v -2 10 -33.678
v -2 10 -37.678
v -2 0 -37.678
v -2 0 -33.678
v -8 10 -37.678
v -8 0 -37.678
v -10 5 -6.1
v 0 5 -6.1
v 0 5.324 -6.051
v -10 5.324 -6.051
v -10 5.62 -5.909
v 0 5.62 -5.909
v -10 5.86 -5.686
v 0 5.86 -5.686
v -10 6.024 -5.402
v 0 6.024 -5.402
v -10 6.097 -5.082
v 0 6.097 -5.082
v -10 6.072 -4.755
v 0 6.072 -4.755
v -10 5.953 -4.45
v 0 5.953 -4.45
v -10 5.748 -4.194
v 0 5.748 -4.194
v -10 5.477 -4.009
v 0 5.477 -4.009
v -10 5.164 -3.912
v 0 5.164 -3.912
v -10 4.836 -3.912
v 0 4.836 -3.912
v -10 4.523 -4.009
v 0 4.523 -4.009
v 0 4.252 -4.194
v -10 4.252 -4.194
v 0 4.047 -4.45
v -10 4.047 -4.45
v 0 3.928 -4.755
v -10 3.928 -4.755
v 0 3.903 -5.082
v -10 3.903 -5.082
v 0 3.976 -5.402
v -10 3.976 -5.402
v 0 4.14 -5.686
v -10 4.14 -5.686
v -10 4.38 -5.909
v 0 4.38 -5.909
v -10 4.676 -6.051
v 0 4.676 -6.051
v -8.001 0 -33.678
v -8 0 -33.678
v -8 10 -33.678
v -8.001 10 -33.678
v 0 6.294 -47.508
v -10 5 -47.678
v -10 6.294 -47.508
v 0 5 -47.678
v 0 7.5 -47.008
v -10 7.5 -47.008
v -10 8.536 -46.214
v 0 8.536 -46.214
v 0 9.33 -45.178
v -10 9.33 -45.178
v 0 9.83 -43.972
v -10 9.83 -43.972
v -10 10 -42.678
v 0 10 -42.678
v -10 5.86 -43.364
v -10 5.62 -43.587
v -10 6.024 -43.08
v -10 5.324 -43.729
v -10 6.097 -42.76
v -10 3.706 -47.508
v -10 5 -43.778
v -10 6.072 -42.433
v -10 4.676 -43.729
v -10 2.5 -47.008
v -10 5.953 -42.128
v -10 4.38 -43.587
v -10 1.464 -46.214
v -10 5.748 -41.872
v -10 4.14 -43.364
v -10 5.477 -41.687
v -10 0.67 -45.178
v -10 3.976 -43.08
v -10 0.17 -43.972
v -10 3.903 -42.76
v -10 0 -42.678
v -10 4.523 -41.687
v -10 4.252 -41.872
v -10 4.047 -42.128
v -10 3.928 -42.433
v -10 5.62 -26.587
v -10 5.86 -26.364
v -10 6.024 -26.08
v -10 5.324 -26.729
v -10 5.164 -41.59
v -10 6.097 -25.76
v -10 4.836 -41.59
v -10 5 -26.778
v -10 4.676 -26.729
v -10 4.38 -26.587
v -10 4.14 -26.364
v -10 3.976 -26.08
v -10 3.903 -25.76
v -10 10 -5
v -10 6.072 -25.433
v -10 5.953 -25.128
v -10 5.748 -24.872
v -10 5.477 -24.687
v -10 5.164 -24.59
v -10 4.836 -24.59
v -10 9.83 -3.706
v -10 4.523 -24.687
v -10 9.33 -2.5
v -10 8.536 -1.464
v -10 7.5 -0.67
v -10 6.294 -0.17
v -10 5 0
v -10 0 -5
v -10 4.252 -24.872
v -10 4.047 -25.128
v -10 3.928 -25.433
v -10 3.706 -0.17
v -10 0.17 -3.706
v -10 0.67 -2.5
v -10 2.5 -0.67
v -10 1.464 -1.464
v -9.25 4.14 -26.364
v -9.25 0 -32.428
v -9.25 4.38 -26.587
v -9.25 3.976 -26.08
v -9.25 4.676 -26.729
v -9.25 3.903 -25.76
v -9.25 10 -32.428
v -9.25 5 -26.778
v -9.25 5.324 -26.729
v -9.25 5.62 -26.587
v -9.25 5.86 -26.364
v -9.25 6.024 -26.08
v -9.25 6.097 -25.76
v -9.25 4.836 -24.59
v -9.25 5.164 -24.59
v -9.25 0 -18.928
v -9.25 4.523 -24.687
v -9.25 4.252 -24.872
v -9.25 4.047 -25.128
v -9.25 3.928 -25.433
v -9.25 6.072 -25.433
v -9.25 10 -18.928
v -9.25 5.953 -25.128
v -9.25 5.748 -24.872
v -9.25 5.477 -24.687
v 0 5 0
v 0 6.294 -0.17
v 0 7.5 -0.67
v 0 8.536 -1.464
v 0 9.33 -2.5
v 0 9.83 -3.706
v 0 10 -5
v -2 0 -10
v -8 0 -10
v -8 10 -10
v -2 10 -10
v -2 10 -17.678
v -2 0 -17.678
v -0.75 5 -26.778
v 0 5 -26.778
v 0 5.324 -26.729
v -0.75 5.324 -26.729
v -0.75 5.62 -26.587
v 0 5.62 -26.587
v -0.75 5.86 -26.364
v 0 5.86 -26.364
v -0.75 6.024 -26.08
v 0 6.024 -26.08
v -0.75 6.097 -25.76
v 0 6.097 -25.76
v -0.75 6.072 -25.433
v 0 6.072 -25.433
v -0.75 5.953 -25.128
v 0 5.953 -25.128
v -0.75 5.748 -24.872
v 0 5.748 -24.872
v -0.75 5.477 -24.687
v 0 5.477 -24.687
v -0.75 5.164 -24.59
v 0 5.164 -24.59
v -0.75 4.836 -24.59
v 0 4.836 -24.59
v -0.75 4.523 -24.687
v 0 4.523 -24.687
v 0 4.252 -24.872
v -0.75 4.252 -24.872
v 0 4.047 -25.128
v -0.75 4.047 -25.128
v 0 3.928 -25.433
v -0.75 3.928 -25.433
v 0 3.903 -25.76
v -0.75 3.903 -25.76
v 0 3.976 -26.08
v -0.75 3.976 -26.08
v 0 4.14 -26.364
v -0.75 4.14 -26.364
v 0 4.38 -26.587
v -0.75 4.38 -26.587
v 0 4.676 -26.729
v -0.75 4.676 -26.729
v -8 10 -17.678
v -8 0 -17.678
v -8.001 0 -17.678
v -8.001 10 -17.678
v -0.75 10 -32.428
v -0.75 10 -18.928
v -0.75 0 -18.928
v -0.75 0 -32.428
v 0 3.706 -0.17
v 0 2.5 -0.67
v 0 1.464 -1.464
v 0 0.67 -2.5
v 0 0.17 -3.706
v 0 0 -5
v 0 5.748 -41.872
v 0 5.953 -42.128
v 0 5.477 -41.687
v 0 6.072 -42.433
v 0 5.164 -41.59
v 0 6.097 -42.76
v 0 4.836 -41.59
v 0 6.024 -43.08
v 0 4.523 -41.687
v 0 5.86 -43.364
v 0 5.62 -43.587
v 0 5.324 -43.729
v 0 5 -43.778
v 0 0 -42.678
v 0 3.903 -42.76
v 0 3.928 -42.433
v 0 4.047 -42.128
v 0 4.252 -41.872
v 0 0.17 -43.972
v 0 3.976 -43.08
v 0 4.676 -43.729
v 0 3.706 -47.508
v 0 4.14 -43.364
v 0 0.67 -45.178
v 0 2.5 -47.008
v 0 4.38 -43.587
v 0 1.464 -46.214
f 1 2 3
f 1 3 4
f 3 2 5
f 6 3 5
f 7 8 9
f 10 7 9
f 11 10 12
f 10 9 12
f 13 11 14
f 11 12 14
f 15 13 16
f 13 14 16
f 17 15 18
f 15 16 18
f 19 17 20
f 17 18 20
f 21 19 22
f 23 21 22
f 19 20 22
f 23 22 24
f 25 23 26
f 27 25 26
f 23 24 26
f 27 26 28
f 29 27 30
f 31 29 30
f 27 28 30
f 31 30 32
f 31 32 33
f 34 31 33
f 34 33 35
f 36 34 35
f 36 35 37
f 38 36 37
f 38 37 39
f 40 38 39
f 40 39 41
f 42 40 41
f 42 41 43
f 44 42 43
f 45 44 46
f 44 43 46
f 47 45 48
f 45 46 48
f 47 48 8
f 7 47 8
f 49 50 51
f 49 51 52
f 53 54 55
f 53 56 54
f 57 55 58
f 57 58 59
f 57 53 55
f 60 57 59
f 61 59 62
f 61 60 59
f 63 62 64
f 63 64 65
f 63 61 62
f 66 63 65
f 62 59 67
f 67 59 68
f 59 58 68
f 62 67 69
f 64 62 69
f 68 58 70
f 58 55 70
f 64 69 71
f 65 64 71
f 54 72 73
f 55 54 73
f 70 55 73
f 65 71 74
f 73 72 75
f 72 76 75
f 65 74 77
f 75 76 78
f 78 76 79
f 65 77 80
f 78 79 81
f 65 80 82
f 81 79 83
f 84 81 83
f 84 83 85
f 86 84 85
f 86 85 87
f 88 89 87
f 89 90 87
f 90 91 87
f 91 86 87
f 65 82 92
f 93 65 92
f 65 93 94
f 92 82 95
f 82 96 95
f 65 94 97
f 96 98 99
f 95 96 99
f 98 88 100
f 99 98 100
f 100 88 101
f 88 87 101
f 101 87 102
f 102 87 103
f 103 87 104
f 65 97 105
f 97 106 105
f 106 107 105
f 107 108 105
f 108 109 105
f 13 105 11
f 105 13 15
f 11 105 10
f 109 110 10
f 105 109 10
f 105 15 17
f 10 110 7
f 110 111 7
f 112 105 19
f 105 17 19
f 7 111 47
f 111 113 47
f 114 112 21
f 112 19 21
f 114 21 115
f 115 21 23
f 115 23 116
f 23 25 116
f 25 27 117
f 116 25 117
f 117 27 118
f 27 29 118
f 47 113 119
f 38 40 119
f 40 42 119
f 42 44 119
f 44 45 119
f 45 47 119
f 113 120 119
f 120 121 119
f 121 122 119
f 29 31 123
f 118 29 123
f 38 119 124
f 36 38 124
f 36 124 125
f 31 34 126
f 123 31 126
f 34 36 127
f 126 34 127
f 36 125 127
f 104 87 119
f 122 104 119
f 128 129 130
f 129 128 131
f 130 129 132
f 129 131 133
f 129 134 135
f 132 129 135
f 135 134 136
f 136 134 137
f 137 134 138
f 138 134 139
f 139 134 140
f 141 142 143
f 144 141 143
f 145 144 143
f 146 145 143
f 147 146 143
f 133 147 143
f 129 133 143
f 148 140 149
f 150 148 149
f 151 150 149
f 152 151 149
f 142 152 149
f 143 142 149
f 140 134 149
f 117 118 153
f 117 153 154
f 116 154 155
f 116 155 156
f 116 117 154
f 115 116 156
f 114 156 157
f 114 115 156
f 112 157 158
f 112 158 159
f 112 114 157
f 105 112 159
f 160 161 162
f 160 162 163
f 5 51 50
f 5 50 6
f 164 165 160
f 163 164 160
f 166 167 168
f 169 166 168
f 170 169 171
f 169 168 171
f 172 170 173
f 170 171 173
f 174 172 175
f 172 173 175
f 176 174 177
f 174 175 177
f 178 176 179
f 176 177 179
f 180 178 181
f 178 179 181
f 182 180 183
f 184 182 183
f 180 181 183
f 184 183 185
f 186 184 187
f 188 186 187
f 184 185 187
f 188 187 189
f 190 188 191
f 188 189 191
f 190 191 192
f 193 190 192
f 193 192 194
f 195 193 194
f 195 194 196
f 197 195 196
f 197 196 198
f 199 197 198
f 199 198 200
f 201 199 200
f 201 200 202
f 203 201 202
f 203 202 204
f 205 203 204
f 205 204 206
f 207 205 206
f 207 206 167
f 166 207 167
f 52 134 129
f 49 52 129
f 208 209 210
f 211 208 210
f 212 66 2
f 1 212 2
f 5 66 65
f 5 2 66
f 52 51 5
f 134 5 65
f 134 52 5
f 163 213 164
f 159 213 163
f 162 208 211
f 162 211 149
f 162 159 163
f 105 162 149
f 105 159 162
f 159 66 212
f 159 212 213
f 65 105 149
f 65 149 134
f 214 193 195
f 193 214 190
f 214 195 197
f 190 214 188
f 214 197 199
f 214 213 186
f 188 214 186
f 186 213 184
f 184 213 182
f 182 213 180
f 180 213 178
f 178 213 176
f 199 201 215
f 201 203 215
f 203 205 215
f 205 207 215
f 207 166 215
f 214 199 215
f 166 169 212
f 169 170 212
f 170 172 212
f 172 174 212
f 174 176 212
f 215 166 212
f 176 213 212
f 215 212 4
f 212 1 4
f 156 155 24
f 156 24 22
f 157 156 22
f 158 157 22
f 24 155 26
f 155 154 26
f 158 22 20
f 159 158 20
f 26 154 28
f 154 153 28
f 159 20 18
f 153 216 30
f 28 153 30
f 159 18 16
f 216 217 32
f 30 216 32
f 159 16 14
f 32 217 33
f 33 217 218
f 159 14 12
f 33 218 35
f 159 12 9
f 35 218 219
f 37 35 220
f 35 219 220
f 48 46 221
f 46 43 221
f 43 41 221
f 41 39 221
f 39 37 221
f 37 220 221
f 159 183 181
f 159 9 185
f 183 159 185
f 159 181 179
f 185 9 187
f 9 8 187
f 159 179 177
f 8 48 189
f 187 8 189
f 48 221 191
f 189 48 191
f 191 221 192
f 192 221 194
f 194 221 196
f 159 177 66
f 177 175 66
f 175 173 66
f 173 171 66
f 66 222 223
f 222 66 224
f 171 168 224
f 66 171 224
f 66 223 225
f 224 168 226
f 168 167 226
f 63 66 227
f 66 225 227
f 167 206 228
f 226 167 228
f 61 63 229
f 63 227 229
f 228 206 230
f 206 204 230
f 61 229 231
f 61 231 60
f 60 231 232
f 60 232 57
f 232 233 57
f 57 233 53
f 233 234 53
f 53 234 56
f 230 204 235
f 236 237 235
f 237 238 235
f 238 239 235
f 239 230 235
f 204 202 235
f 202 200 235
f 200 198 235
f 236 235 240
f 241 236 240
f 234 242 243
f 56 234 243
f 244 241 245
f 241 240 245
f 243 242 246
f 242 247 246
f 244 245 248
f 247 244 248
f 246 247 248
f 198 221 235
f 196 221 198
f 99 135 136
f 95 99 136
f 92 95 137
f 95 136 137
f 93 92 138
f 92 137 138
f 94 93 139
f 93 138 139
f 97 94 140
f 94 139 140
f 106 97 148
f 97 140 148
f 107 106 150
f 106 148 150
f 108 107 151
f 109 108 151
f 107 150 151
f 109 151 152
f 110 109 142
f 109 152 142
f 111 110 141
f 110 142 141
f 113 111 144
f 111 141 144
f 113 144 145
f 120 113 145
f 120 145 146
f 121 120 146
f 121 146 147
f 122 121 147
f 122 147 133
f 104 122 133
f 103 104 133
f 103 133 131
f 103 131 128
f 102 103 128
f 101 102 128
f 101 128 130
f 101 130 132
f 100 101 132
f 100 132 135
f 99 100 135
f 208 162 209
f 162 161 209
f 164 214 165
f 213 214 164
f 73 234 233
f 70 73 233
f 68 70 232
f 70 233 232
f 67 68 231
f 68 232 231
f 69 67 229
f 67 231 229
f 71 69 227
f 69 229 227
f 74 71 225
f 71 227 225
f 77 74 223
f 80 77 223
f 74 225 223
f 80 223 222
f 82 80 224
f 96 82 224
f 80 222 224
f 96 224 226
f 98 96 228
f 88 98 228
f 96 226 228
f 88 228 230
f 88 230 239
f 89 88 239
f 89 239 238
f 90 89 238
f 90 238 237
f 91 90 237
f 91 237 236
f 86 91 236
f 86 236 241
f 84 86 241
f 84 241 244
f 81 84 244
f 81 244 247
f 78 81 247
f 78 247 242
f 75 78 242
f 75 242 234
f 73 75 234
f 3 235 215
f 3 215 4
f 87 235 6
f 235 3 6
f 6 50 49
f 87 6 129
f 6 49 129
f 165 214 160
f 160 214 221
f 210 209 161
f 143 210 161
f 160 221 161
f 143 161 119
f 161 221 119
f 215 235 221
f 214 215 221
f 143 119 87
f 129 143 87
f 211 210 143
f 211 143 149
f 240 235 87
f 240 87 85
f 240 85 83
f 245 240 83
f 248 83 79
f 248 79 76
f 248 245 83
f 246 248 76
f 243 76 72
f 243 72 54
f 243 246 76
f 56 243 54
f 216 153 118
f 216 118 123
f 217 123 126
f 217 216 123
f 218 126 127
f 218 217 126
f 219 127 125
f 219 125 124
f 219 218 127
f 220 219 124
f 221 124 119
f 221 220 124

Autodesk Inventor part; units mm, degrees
ref_plane "YZ Plane" through (0, 0, 0) normal (1, 0, 0) x (0, 1, 0)
ref_plane "XZ Plane" through (0, 0, 0) normal (0, 1, 0) x (-1, 0, 0)
ref_plane "XY Plane" through (0, 0, 0) normal (0, 0, 1) x (1, 0, 0)
sketch "Sketch1" plane through (0, 0, 0) normal (0, 1, 0) x (-1, 0, 0)
  line L0 (0, 0) -> (0, -60)
  line L1 (0, -60) -> (10, -60)
  line L2 (10, -60) -> (10, 0)
  line L3 (10, 0) -> (0, 0)
  line L4 (10, -60) -> (10, -58)
  line L5 (10, -58) -> (0, -58)
  line L6 (10, -58) -> (8, -58)
  line L7 (0, 0) -> (2, 0)
  line L8 (2, 0) -> (2, -2)
  line L9 (2, -2) -> (0, -2)
  line L10 (0, -2) -> (0, 0)
  line L11 (2, -2) -> (8, -2)
  line L12 (8, -2) -> (8, -58)
  line L13 (8, -58) -> (2, -58)
  line L14 (2, -58) -> (2, -2)
  line L15 (10, 0) -> (10, -10)
  line L16 (10, -10) -> (0, -10)
  line L17 (8, -10) -> (8, -18)
  line L18 (8, -18) -> (2, -18)
  line L19 (2, -18) -> (1, -18)
  point P0 (2, -10)
  dimension "d0" = 60
  dimension "d1" = 10
  dimension "d2" = 2
  dimension "d3" = 2
  dimension "d4" = 2
  dimension "d5" = 2
  dimension "d8" = 10
  dimension "d29" = 8
extrude "Extrusion1" add sketch "Sketch1" along normal blind 10 contours L3 L8 L9 L0 | L9 L14 L16 L0 | L3 L2 L16 L12 L11 L8 | L16 L14 L5 L0 | L11 L12 L16 L14 | L5 L2 L1 L0 | L2 L5 L12 L16
fillet "Fillet1" radius 5 2 edges at (-5, 10, 0) (-5, 0, 0)
sketch "Sketch2" plane through (0, 0, -60) normal (1, 0, 0) x (0, 0, -1)
  arc A0 (-55, 10) -> (-55, 0) centre (-55, 5) ccw projected
  line L0 (-55, 10) -> (-55, 0)
  circle A1 centre (-55, 5) radius 1.1
  point P0 (-60, 0)
  dimension "d10" = 2.2
extrude "Extrusion2" cut sketch "Sketch2" against normal through all contours A1 L0 | L0 A1
sketch "Sketch3" plane through (0, 0, -60) normal (1, 0, 0) x (0, 0, -1)
  circle A0 centre (-55, 5) radius 1.1 projected
  line L0 (-55, 5) -> (-34.322, 5)
  circle A1 centre (-34.322, 5) radius 1.1
  point P0 (-60, 0)
  dimension "d13" = 20.678
  dimension "d53" = 2.2
extrude "Extrusion3" cut sketch "Sketch3" against normal through all contours A1
sketch "Sketch5" plane through (0, 10, 0) normal (0, 1, 0) x (1, 0, 0)
  line L0 (0, 26.778) -> (0, 24.578) projected
  line L1 (0, 25.678) -> (0, 37.678)
  line L2 (0, 37.678) -> (-10, 37.678)
  line L3 (-10, 60) -> (-10, 5) projected
  line L4 (-10, 37.678) -> (-10, 39.678)
  line L5 (-10, 39.678) -> (0, 39.678)
  line L6 (0, 5) -> (0, 60) projected
  line L7 (0, 39.678) -> (0, 41.678)
  line L8 (0, 41.678) -> (-10, 41.678)
  line L9 (-10, 39.678) -> (-10, 41.678)
  line L10 (0, 37.678) -> (0, 47.678)
  line L11 (0, 47.678) -> (-10, 47.678)
  line L12 (-10, 60) -> (-10, 5) projected
  point P0 (0, 0)
  point P1 (0, 41.678)
  dimension "d17" = 12
  dimension "d18" = 2
  dimension "d19" = 2
  dimension "d22" = 10
extrude "Extrusion4" add sketch "Sketch5" against normal blind 10
sketch "Sketch6" plane through (0, 10, 0) normal (0, 1, 0) x (1, 0, 0)
  line L0 (-10, 60) -> (0, 60)
  line L1 (0, 60) -> (0, 50.678)
  line L2 (0, 50.678) -> (-10, 50.678)
  line L3 (-10, 50.678) -> (-10, 60)
  line L4 (-10, 60) -> (-10, 47.678)
  line L5 (-10, 47.678) -> (0, 47.678)
  line L6 (-2, 47.678) -> (-8, 47.678) projected
  line L7 (0, 47.678) -> (0, 50.678)
  line L8 (0, 5) -> (0, 60) projected
  point P0 (0, 0)
extrude "Extrusion5" cut sketch "Sketch6" against normal blind 10
sketch "Sketch7" plane through (0, 5, -5) normal (1, 0, 0) x (0, 0, -1)
  line L0 (42.678, 5) -> (0, 5) projected
  circle A0 centre (37.678, 0) radius 1.1
  line L1 (5, 5) -> (32.678, 5) projected
  line L2 (37.678, 5) -> (37.678, -5)
  point P0 (-5, -5)
  point P1 (40.678, 5)
  point P2 (40.678, -5)
  point P3 (45.678, 5)
extrude "Extrusion6" cut sketch "Sketch7" against normal through all
sketch "Sketch8" plane through (0, 10, 0) normal (0, 1, 0) x (1, 0, 0)
  line L0 (0, 26.778) -> (0, 24.578) projected
  line L1 (0, 25.678) -> (-8, 25.678)
  line L2 (-8, 26.778) -> (-8, 24.578) projected
  line L3 (0, 25.678) -> (0, 17.678)
  line L4 (0, 5) -> (0, 47.678) projected
  line L5 (0, 17.678) -> (-2, 17.678)
  line L6 (-2, 37.678) -> (-2, 10) projected
  line L7 (-2, 17.678) -> (-1, 17.678)
  line L8 (-1, 17.678) -> (-1, 33.678)
  line L9 (-1, 33.678) -> (-2, 33.678)
  line L10 (-2, 33.678) -> (-9, 33.678)
  line L11 (-9, 33.678) -> (-9, 17.678)
  line L12 (-9, 17.678) -> (-2, 17.678)
  line L13 (-9, 33.678) -> (-9.25, 33.678)
  line L14 (-9.25, 33.678) -> (-9.25, 17.678)
  line L15 (-9.25, 17.678) -> (-9, 17.678)
  line L16 (-1, 17.678) -> (-0.75, 17.678)
  line L17 (-0.75, 17.678) -> (-0.75, 33.678)
  line L18 (-0.75, 33.678) -> (-1, 33.678)
  point P0 (0, 0)
  point P1 (0, 45.678)
  point P2 (0, 50.678)
  dimension "d30" = 8
  dimension "d31" = 16
  dimension "d32" = 7
  dimension "d50" = 0.25
  dimension "d51" = 0.25
extrude "Extrusion7" cut sketch "Sketch8" against normal blind 10 contours L17 L5 L8 L1 | L1 L8 L18 L17 | L8 L5 L6 L1 | L1 L6 L9 L8 | L6 L12 L11 L10 | L11 L15 L14 L13
fillet "Fillet3" radius 5 2 edges at (-5, 10, -47.678) (-5, 0, -47.678)
chamfer "Chamfer2" distance 1.25 angle 45 4 edges at (-9.25, 5, -17.678) (-9.25, 5, -33.678) (-0.75, 5, -17.678) (-0.75, 5, -33.678)
properties part number "mid"
